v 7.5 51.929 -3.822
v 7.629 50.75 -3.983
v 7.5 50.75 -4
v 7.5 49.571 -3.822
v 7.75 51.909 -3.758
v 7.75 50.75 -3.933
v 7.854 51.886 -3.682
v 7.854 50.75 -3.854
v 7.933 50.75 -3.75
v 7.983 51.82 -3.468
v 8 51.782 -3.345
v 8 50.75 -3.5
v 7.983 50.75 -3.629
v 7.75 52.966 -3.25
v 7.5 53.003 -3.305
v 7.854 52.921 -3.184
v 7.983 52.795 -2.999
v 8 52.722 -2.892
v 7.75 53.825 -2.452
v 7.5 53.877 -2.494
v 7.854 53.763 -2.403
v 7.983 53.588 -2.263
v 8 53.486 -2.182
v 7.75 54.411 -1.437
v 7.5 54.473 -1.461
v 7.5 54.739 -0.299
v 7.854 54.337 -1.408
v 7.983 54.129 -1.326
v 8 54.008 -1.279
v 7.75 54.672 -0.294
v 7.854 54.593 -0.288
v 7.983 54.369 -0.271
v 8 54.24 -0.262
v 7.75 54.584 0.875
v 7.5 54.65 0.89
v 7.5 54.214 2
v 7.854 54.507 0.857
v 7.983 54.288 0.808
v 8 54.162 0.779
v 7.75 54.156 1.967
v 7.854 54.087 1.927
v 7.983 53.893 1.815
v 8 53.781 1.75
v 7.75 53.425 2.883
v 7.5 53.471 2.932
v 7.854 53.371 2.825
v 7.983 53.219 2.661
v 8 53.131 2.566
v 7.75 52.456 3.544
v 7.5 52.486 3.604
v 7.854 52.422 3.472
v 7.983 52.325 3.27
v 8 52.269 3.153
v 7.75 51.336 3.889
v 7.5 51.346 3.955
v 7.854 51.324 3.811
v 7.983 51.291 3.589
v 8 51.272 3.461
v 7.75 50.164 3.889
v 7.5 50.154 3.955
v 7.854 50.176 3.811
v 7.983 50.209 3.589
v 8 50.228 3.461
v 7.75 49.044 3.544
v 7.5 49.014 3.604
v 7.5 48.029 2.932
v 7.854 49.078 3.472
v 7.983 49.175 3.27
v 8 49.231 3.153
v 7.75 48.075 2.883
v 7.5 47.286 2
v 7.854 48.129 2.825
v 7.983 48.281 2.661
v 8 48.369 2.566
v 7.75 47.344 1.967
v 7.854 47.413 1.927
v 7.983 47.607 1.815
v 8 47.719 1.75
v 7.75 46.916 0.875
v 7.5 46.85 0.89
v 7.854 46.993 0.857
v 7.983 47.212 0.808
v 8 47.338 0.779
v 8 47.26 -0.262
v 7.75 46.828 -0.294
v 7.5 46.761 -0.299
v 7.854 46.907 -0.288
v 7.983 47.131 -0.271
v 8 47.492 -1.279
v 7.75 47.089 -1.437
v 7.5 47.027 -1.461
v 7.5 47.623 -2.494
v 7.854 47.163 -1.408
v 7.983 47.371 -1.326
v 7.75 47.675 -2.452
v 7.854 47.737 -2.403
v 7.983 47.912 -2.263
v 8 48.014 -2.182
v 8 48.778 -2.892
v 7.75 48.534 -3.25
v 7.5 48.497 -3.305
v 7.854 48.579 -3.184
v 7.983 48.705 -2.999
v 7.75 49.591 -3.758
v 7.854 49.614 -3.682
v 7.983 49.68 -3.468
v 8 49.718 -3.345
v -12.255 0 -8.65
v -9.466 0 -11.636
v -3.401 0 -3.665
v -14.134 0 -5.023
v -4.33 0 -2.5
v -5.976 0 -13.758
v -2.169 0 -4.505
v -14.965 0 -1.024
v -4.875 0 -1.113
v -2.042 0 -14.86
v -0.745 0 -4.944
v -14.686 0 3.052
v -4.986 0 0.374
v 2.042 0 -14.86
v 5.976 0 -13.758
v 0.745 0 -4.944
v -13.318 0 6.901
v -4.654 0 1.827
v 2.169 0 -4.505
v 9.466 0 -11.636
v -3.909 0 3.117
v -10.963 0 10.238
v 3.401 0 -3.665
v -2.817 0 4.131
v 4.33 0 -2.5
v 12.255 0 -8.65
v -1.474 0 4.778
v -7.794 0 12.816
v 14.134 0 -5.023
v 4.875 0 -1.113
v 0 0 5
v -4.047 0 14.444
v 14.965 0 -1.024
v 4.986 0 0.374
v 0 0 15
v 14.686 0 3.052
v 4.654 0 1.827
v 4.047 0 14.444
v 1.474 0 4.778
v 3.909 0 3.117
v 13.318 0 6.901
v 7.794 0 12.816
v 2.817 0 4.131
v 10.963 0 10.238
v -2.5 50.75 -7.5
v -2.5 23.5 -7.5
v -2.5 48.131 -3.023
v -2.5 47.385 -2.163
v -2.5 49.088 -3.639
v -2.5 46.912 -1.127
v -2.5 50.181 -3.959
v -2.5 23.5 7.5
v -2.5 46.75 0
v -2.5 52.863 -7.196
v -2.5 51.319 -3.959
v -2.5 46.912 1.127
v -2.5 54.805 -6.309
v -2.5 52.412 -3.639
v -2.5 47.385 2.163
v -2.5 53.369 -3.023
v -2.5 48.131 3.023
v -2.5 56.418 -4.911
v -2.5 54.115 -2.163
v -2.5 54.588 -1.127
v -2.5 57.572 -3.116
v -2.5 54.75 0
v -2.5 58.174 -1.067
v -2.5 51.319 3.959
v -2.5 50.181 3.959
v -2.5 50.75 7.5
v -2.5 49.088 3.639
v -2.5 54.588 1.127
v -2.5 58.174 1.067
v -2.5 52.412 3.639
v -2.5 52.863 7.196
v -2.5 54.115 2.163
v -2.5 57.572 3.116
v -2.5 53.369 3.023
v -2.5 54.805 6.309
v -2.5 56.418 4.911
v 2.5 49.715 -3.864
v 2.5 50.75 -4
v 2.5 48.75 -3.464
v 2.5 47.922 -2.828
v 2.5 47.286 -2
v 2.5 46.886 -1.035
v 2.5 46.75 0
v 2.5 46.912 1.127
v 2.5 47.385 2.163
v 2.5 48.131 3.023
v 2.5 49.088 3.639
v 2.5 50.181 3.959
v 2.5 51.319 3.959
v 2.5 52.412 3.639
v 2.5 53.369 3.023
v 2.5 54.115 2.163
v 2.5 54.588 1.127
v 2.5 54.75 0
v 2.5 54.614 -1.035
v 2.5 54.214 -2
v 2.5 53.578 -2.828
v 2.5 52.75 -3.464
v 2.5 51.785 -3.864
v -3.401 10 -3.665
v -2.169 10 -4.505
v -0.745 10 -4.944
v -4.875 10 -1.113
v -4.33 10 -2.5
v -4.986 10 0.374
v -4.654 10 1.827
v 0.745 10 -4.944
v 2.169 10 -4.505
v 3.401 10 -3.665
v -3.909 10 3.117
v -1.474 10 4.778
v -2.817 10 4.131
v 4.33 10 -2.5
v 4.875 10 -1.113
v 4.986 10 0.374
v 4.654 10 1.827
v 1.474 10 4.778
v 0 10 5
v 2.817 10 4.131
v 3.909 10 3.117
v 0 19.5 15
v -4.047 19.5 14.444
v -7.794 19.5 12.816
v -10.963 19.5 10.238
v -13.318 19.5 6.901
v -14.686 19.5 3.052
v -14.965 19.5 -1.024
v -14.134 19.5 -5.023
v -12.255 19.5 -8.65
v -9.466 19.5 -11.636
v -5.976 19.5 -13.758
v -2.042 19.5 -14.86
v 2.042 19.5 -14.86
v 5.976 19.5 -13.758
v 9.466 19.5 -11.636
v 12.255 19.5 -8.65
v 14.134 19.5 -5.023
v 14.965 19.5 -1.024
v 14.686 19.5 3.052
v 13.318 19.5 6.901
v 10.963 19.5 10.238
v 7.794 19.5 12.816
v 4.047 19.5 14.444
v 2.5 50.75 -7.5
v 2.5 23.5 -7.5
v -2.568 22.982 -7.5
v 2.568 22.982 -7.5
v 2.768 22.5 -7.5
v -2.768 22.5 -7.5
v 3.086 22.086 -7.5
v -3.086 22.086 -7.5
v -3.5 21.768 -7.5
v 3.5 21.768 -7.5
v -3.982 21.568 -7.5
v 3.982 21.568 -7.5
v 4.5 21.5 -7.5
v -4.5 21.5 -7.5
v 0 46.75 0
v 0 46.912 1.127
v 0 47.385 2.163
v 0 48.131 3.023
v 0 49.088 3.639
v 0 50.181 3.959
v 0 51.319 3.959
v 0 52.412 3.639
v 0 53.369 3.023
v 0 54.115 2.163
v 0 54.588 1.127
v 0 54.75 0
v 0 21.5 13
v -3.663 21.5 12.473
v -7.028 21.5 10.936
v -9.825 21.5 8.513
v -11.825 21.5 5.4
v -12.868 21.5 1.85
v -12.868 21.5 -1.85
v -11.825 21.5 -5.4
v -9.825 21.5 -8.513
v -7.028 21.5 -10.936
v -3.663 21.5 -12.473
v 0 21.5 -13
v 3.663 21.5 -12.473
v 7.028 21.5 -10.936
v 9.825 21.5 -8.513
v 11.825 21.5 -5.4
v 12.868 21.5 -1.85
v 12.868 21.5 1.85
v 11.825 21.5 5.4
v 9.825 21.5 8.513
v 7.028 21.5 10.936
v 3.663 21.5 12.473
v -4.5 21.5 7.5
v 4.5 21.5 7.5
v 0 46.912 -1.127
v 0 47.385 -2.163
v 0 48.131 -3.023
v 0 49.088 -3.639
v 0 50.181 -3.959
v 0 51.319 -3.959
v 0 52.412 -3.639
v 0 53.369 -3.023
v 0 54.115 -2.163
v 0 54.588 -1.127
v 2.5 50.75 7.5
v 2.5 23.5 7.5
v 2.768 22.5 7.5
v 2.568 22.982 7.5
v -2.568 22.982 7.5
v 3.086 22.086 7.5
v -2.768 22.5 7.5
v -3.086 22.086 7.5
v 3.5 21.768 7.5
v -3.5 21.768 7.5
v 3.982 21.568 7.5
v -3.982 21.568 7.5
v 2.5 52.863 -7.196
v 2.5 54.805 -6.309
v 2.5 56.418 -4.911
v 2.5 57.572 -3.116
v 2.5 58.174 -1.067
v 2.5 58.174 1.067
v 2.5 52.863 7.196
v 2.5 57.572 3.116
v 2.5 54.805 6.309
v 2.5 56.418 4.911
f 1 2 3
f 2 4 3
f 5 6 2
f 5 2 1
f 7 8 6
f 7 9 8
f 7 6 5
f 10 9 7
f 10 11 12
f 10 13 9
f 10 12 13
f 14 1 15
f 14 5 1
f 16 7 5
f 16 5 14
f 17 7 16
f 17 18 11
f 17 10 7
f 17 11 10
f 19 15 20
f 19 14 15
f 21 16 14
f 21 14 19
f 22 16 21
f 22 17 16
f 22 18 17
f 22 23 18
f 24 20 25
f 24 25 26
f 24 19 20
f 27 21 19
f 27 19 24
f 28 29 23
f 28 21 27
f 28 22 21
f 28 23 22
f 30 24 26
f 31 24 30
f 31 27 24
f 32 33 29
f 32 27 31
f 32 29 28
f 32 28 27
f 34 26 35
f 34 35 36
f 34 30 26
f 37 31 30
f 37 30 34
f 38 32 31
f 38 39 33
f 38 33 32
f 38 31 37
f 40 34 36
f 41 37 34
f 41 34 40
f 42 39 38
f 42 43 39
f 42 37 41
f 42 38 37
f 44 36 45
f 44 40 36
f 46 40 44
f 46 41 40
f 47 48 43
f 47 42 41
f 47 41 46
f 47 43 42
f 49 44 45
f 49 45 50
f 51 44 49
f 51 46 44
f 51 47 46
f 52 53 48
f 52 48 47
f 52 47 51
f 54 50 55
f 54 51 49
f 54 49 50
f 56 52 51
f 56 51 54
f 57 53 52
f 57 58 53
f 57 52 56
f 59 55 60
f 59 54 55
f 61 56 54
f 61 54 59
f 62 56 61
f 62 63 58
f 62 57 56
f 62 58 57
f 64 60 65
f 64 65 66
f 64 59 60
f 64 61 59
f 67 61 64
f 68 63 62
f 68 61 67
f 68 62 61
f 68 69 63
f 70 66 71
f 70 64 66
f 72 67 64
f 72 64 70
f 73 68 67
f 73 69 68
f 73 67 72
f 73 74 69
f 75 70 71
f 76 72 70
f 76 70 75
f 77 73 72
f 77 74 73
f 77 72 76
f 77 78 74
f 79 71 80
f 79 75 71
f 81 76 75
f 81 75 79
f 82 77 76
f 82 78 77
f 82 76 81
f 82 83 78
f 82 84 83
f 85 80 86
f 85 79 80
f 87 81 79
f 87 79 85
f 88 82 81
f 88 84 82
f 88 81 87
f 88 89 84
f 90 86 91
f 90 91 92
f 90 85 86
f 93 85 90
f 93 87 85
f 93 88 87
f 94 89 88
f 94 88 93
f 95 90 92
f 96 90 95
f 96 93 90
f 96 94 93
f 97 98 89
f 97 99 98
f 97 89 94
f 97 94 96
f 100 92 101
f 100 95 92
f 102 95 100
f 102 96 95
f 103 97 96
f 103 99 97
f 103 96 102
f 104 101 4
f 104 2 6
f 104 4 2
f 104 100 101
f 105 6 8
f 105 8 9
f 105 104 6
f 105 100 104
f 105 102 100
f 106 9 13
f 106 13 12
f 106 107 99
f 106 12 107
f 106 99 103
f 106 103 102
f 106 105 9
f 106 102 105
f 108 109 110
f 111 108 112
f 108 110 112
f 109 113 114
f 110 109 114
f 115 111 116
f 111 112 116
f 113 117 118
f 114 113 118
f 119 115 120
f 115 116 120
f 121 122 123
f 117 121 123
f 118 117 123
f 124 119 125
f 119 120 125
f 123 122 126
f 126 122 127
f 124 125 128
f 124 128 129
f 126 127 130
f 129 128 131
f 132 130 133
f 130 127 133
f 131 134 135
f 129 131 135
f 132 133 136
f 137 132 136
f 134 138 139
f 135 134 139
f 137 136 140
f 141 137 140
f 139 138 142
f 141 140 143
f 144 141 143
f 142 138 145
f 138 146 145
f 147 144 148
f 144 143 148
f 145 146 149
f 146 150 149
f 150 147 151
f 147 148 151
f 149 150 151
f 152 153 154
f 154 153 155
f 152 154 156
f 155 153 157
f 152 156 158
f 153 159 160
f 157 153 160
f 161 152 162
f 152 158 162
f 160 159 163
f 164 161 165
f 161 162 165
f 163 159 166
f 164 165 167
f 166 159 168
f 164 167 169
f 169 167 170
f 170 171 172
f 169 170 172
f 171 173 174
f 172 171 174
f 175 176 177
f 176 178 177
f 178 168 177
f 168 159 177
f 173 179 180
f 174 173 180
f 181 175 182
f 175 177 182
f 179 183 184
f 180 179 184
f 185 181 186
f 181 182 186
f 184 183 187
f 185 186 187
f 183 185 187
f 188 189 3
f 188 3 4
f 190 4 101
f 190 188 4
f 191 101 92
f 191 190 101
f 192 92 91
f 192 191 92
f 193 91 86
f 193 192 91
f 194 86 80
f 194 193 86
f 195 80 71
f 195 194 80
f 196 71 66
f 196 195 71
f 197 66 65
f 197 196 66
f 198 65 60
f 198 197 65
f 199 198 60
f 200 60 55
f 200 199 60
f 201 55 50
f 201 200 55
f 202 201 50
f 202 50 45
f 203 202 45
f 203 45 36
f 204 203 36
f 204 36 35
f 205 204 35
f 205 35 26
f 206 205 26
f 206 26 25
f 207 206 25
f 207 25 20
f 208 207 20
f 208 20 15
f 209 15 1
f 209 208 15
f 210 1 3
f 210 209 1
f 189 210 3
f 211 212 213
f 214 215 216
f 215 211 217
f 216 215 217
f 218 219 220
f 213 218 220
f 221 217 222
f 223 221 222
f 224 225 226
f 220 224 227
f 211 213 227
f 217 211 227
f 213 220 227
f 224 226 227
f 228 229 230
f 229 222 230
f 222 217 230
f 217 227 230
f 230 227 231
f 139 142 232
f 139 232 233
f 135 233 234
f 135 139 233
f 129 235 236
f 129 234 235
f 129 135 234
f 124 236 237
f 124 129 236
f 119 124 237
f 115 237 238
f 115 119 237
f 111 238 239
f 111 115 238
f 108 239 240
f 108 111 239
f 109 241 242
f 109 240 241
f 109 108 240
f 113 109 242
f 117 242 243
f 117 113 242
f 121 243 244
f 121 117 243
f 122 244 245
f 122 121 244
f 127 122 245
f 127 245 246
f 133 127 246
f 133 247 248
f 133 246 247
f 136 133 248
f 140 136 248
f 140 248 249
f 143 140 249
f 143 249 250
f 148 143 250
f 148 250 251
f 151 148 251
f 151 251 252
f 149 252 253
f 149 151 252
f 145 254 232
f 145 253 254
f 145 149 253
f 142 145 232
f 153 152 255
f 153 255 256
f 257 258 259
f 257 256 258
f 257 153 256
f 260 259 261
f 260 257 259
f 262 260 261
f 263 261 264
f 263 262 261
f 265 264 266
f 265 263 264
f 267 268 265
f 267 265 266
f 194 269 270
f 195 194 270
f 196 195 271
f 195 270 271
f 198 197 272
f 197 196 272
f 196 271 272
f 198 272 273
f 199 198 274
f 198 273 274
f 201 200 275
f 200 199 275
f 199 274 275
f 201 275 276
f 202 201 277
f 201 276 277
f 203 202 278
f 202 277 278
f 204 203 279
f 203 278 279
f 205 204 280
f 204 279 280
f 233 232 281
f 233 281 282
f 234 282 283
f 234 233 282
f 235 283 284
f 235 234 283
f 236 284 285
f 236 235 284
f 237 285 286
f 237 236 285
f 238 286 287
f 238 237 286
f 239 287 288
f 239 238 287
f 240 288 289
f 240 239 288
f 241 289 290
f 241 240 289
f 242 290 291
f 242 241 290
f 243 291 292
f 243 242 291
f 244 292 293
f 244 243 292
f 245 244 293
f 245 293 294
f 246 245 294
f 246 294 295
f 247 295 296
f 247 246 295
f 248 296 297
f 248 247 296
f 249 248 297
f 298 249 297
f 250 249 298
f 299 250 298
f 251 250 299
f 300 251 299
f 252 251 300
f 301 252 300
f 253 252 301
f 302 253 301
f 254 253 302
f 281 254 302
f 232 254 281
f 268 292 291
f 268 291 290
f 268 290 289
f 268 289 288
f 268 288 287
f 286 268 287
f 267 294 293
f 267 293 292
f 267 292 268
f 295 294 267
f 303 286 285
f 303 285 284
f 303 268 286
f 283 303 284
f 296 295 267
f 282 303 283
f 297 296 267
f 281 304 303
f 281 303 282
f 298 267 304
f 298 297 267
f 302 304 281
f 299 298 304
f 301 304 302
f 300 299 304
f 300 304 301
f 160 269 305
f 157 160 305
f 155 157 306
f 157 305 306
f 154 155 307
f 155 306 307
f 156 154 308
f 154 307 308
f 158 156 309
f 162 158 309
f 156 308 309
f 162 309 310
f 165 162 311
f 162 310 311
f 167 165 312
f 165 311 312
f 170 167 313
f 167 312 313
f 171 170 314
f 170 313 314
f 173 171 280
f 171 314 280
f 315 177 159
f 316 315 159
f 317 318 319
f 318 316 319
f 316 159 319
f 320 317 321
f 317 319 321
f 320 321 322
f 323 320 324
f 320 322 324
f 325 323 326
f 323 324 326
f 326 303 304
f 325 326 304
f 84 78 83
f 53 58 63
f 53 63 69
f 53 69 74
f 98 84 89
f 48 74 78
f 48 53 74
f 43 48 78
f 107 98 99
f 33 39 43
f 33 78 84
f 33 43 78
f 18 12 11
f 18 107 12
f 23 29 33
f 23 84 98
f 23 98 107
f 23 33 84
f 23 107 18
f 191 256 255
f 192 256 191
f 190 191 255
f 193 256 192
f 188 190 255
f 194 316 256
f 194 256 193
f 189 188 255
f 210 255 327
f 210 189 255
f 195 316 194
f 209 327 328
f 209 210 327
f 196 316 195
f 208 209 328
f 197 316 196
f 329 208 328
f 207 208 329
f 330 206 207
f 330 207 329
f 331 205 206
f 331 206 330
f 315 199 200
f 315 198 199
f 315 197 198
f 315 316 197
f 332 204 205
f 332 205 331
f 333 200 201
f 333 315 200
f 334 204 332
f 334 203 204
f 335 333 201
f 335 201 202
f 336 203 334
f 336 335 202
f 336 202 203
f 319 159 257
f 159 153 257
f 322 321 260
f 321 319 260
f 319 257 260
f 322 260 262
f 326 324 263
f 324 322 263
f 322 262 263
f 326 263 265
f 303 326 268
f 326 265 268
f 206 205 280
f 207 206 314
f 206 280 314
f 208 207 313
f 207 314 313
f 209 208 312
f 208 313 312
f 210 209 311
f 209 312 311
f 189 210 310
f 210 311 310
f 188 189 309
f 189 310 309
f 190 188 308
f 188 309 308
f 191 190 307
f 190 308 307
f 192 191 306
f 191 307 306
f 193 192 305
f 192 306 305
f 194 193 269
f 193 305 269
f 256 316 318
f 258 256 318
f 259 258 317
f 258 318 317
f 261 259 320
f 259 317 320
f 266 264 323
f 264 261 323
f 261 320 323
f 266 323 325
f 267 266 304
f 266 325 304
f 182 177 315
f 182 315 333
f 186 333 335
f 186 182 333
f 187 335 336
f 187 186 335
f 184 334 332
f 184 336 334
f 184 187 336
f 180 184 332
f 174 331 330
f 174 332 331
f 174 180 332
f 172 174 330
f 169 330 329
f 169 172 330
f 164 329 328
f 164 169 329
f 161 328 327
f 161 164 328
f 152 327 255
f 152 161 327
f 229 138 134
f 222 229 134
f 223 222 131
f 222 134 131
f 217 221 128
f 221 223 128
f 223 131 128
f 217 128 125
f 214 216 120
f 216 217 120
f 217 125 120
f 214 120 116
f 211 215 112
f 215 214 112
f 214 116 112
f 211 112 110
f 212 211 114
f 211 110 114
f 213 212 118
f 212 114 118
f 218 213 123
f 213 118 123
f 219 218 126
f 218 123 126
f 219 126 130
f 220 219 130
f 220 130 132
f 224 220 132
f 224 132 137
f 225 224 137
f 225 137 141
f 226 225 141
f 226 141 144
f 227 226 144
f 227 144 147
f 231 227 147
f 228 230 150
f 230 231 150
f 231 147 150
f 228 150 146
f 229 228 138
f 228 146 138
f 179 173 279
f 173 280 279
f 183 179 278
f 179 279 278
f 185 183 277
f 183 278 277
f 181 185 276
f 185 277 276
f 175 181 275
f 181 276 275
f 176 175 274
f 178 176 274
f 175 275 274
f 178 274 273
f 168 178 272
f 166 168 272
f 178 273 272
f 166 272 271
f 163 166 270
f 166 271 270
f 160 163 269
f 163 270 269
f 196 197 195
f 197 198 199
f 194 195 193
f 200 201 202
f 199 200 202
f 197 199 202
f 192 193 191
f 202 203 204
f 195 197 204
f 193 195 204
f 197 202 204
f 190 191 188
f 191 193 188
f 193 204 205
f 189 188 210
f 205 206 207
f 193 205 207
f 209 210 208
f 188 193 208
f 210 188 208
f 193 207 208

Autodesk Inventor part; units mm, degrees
ref_plane "YZ Plane" through (0, 0, 0) normal (1, 0, 0) x (0, 1, 0)
ref_plane "XZ Plane" through (0, 0, 0) normal (0, 1, 0) x (-1, 0, 0)
ref_plane "XY Plane" through (0, 0, 0) normal (0, 0, 1) x (1, 0, 0)
sketch "Esboço1" plane through (0, 0, 0) normal (1, 0, 0) x (0, 1, 0)
  line L0 (0, 5) -> (10, 5)
  line L1 (10, 5) -> (10, -5)
  line L2 (10, -5) -> (0, -5)
  line L3 (0, 5) -> (0, 15)
  line L4 (0, -5) -> (0, -15)
  line L5 (0, 15) -> (21.5, 15)
  line L6 (21.5, 15) -> (21.5, -15)
  line L7 (21.5, -15) -> (0, -15)
  line L8 (0, 0) -> (50.75, 0)
  point P0 (21.5, 0)
  point P1 (10, 0)
  dimension "d8" = 50.75
revolve "Revolução1" add sketch "Esboço1" angle 360 mid plane about axis through (0, 0, 0) along (0, 1, 0) contours L8 L6 L7 L4 L2 L1
chamfer "Chanfro1" distance 2 angle 45 1 edges at (0, 21.5, -15) measured on face at (-1.207, 7.1667, 14.9514)
sketch "Esboço2" plane through (0, 0, 0) normal (1, 0, 0) x (0, 1, 0)
  line L0 (0, 0) -> (50.75, 0)
  circle A0 centre (50.75, 0) radius 4
  arc A1 (50.75, -7.5) -> (50.75, 7.5) centre (50.75, 0) ccw
  line L1 (50.75, 7.5) -> (21.5, 7.5)
  line L2 (50.75, -7.5) -> (21.5, -7.5)
  line L3 (21.5, 7.5) -> (21.5, -7.5)
  line L4 (21.5, 13) -> (21.5, -13) projected
extrude "Extrusão1" add sketch "Esboço2" along normal mid plane 5
fillet "Arredondamento1" radius 2 2 edges at (2.5, 21.5, 0) (-2.5, 21.5, 0)
sketch "Esboço3" plane through (2.5, 0, 0) normal (1, 0, 0) x (0, 0, -1)
  circle A0 centre (0, 50.75) radius 4 projected
  circle A1 centre (0, 50.75) radius 4
  point P0 (0, 0)
  dimension "d19" = 8
extrude "Extrusão2" add sketch "Esboço3" along normal blind 5.5
fillet "Arredondamento2" radius 0.5 1 edges at (8, 50.75, 4)
